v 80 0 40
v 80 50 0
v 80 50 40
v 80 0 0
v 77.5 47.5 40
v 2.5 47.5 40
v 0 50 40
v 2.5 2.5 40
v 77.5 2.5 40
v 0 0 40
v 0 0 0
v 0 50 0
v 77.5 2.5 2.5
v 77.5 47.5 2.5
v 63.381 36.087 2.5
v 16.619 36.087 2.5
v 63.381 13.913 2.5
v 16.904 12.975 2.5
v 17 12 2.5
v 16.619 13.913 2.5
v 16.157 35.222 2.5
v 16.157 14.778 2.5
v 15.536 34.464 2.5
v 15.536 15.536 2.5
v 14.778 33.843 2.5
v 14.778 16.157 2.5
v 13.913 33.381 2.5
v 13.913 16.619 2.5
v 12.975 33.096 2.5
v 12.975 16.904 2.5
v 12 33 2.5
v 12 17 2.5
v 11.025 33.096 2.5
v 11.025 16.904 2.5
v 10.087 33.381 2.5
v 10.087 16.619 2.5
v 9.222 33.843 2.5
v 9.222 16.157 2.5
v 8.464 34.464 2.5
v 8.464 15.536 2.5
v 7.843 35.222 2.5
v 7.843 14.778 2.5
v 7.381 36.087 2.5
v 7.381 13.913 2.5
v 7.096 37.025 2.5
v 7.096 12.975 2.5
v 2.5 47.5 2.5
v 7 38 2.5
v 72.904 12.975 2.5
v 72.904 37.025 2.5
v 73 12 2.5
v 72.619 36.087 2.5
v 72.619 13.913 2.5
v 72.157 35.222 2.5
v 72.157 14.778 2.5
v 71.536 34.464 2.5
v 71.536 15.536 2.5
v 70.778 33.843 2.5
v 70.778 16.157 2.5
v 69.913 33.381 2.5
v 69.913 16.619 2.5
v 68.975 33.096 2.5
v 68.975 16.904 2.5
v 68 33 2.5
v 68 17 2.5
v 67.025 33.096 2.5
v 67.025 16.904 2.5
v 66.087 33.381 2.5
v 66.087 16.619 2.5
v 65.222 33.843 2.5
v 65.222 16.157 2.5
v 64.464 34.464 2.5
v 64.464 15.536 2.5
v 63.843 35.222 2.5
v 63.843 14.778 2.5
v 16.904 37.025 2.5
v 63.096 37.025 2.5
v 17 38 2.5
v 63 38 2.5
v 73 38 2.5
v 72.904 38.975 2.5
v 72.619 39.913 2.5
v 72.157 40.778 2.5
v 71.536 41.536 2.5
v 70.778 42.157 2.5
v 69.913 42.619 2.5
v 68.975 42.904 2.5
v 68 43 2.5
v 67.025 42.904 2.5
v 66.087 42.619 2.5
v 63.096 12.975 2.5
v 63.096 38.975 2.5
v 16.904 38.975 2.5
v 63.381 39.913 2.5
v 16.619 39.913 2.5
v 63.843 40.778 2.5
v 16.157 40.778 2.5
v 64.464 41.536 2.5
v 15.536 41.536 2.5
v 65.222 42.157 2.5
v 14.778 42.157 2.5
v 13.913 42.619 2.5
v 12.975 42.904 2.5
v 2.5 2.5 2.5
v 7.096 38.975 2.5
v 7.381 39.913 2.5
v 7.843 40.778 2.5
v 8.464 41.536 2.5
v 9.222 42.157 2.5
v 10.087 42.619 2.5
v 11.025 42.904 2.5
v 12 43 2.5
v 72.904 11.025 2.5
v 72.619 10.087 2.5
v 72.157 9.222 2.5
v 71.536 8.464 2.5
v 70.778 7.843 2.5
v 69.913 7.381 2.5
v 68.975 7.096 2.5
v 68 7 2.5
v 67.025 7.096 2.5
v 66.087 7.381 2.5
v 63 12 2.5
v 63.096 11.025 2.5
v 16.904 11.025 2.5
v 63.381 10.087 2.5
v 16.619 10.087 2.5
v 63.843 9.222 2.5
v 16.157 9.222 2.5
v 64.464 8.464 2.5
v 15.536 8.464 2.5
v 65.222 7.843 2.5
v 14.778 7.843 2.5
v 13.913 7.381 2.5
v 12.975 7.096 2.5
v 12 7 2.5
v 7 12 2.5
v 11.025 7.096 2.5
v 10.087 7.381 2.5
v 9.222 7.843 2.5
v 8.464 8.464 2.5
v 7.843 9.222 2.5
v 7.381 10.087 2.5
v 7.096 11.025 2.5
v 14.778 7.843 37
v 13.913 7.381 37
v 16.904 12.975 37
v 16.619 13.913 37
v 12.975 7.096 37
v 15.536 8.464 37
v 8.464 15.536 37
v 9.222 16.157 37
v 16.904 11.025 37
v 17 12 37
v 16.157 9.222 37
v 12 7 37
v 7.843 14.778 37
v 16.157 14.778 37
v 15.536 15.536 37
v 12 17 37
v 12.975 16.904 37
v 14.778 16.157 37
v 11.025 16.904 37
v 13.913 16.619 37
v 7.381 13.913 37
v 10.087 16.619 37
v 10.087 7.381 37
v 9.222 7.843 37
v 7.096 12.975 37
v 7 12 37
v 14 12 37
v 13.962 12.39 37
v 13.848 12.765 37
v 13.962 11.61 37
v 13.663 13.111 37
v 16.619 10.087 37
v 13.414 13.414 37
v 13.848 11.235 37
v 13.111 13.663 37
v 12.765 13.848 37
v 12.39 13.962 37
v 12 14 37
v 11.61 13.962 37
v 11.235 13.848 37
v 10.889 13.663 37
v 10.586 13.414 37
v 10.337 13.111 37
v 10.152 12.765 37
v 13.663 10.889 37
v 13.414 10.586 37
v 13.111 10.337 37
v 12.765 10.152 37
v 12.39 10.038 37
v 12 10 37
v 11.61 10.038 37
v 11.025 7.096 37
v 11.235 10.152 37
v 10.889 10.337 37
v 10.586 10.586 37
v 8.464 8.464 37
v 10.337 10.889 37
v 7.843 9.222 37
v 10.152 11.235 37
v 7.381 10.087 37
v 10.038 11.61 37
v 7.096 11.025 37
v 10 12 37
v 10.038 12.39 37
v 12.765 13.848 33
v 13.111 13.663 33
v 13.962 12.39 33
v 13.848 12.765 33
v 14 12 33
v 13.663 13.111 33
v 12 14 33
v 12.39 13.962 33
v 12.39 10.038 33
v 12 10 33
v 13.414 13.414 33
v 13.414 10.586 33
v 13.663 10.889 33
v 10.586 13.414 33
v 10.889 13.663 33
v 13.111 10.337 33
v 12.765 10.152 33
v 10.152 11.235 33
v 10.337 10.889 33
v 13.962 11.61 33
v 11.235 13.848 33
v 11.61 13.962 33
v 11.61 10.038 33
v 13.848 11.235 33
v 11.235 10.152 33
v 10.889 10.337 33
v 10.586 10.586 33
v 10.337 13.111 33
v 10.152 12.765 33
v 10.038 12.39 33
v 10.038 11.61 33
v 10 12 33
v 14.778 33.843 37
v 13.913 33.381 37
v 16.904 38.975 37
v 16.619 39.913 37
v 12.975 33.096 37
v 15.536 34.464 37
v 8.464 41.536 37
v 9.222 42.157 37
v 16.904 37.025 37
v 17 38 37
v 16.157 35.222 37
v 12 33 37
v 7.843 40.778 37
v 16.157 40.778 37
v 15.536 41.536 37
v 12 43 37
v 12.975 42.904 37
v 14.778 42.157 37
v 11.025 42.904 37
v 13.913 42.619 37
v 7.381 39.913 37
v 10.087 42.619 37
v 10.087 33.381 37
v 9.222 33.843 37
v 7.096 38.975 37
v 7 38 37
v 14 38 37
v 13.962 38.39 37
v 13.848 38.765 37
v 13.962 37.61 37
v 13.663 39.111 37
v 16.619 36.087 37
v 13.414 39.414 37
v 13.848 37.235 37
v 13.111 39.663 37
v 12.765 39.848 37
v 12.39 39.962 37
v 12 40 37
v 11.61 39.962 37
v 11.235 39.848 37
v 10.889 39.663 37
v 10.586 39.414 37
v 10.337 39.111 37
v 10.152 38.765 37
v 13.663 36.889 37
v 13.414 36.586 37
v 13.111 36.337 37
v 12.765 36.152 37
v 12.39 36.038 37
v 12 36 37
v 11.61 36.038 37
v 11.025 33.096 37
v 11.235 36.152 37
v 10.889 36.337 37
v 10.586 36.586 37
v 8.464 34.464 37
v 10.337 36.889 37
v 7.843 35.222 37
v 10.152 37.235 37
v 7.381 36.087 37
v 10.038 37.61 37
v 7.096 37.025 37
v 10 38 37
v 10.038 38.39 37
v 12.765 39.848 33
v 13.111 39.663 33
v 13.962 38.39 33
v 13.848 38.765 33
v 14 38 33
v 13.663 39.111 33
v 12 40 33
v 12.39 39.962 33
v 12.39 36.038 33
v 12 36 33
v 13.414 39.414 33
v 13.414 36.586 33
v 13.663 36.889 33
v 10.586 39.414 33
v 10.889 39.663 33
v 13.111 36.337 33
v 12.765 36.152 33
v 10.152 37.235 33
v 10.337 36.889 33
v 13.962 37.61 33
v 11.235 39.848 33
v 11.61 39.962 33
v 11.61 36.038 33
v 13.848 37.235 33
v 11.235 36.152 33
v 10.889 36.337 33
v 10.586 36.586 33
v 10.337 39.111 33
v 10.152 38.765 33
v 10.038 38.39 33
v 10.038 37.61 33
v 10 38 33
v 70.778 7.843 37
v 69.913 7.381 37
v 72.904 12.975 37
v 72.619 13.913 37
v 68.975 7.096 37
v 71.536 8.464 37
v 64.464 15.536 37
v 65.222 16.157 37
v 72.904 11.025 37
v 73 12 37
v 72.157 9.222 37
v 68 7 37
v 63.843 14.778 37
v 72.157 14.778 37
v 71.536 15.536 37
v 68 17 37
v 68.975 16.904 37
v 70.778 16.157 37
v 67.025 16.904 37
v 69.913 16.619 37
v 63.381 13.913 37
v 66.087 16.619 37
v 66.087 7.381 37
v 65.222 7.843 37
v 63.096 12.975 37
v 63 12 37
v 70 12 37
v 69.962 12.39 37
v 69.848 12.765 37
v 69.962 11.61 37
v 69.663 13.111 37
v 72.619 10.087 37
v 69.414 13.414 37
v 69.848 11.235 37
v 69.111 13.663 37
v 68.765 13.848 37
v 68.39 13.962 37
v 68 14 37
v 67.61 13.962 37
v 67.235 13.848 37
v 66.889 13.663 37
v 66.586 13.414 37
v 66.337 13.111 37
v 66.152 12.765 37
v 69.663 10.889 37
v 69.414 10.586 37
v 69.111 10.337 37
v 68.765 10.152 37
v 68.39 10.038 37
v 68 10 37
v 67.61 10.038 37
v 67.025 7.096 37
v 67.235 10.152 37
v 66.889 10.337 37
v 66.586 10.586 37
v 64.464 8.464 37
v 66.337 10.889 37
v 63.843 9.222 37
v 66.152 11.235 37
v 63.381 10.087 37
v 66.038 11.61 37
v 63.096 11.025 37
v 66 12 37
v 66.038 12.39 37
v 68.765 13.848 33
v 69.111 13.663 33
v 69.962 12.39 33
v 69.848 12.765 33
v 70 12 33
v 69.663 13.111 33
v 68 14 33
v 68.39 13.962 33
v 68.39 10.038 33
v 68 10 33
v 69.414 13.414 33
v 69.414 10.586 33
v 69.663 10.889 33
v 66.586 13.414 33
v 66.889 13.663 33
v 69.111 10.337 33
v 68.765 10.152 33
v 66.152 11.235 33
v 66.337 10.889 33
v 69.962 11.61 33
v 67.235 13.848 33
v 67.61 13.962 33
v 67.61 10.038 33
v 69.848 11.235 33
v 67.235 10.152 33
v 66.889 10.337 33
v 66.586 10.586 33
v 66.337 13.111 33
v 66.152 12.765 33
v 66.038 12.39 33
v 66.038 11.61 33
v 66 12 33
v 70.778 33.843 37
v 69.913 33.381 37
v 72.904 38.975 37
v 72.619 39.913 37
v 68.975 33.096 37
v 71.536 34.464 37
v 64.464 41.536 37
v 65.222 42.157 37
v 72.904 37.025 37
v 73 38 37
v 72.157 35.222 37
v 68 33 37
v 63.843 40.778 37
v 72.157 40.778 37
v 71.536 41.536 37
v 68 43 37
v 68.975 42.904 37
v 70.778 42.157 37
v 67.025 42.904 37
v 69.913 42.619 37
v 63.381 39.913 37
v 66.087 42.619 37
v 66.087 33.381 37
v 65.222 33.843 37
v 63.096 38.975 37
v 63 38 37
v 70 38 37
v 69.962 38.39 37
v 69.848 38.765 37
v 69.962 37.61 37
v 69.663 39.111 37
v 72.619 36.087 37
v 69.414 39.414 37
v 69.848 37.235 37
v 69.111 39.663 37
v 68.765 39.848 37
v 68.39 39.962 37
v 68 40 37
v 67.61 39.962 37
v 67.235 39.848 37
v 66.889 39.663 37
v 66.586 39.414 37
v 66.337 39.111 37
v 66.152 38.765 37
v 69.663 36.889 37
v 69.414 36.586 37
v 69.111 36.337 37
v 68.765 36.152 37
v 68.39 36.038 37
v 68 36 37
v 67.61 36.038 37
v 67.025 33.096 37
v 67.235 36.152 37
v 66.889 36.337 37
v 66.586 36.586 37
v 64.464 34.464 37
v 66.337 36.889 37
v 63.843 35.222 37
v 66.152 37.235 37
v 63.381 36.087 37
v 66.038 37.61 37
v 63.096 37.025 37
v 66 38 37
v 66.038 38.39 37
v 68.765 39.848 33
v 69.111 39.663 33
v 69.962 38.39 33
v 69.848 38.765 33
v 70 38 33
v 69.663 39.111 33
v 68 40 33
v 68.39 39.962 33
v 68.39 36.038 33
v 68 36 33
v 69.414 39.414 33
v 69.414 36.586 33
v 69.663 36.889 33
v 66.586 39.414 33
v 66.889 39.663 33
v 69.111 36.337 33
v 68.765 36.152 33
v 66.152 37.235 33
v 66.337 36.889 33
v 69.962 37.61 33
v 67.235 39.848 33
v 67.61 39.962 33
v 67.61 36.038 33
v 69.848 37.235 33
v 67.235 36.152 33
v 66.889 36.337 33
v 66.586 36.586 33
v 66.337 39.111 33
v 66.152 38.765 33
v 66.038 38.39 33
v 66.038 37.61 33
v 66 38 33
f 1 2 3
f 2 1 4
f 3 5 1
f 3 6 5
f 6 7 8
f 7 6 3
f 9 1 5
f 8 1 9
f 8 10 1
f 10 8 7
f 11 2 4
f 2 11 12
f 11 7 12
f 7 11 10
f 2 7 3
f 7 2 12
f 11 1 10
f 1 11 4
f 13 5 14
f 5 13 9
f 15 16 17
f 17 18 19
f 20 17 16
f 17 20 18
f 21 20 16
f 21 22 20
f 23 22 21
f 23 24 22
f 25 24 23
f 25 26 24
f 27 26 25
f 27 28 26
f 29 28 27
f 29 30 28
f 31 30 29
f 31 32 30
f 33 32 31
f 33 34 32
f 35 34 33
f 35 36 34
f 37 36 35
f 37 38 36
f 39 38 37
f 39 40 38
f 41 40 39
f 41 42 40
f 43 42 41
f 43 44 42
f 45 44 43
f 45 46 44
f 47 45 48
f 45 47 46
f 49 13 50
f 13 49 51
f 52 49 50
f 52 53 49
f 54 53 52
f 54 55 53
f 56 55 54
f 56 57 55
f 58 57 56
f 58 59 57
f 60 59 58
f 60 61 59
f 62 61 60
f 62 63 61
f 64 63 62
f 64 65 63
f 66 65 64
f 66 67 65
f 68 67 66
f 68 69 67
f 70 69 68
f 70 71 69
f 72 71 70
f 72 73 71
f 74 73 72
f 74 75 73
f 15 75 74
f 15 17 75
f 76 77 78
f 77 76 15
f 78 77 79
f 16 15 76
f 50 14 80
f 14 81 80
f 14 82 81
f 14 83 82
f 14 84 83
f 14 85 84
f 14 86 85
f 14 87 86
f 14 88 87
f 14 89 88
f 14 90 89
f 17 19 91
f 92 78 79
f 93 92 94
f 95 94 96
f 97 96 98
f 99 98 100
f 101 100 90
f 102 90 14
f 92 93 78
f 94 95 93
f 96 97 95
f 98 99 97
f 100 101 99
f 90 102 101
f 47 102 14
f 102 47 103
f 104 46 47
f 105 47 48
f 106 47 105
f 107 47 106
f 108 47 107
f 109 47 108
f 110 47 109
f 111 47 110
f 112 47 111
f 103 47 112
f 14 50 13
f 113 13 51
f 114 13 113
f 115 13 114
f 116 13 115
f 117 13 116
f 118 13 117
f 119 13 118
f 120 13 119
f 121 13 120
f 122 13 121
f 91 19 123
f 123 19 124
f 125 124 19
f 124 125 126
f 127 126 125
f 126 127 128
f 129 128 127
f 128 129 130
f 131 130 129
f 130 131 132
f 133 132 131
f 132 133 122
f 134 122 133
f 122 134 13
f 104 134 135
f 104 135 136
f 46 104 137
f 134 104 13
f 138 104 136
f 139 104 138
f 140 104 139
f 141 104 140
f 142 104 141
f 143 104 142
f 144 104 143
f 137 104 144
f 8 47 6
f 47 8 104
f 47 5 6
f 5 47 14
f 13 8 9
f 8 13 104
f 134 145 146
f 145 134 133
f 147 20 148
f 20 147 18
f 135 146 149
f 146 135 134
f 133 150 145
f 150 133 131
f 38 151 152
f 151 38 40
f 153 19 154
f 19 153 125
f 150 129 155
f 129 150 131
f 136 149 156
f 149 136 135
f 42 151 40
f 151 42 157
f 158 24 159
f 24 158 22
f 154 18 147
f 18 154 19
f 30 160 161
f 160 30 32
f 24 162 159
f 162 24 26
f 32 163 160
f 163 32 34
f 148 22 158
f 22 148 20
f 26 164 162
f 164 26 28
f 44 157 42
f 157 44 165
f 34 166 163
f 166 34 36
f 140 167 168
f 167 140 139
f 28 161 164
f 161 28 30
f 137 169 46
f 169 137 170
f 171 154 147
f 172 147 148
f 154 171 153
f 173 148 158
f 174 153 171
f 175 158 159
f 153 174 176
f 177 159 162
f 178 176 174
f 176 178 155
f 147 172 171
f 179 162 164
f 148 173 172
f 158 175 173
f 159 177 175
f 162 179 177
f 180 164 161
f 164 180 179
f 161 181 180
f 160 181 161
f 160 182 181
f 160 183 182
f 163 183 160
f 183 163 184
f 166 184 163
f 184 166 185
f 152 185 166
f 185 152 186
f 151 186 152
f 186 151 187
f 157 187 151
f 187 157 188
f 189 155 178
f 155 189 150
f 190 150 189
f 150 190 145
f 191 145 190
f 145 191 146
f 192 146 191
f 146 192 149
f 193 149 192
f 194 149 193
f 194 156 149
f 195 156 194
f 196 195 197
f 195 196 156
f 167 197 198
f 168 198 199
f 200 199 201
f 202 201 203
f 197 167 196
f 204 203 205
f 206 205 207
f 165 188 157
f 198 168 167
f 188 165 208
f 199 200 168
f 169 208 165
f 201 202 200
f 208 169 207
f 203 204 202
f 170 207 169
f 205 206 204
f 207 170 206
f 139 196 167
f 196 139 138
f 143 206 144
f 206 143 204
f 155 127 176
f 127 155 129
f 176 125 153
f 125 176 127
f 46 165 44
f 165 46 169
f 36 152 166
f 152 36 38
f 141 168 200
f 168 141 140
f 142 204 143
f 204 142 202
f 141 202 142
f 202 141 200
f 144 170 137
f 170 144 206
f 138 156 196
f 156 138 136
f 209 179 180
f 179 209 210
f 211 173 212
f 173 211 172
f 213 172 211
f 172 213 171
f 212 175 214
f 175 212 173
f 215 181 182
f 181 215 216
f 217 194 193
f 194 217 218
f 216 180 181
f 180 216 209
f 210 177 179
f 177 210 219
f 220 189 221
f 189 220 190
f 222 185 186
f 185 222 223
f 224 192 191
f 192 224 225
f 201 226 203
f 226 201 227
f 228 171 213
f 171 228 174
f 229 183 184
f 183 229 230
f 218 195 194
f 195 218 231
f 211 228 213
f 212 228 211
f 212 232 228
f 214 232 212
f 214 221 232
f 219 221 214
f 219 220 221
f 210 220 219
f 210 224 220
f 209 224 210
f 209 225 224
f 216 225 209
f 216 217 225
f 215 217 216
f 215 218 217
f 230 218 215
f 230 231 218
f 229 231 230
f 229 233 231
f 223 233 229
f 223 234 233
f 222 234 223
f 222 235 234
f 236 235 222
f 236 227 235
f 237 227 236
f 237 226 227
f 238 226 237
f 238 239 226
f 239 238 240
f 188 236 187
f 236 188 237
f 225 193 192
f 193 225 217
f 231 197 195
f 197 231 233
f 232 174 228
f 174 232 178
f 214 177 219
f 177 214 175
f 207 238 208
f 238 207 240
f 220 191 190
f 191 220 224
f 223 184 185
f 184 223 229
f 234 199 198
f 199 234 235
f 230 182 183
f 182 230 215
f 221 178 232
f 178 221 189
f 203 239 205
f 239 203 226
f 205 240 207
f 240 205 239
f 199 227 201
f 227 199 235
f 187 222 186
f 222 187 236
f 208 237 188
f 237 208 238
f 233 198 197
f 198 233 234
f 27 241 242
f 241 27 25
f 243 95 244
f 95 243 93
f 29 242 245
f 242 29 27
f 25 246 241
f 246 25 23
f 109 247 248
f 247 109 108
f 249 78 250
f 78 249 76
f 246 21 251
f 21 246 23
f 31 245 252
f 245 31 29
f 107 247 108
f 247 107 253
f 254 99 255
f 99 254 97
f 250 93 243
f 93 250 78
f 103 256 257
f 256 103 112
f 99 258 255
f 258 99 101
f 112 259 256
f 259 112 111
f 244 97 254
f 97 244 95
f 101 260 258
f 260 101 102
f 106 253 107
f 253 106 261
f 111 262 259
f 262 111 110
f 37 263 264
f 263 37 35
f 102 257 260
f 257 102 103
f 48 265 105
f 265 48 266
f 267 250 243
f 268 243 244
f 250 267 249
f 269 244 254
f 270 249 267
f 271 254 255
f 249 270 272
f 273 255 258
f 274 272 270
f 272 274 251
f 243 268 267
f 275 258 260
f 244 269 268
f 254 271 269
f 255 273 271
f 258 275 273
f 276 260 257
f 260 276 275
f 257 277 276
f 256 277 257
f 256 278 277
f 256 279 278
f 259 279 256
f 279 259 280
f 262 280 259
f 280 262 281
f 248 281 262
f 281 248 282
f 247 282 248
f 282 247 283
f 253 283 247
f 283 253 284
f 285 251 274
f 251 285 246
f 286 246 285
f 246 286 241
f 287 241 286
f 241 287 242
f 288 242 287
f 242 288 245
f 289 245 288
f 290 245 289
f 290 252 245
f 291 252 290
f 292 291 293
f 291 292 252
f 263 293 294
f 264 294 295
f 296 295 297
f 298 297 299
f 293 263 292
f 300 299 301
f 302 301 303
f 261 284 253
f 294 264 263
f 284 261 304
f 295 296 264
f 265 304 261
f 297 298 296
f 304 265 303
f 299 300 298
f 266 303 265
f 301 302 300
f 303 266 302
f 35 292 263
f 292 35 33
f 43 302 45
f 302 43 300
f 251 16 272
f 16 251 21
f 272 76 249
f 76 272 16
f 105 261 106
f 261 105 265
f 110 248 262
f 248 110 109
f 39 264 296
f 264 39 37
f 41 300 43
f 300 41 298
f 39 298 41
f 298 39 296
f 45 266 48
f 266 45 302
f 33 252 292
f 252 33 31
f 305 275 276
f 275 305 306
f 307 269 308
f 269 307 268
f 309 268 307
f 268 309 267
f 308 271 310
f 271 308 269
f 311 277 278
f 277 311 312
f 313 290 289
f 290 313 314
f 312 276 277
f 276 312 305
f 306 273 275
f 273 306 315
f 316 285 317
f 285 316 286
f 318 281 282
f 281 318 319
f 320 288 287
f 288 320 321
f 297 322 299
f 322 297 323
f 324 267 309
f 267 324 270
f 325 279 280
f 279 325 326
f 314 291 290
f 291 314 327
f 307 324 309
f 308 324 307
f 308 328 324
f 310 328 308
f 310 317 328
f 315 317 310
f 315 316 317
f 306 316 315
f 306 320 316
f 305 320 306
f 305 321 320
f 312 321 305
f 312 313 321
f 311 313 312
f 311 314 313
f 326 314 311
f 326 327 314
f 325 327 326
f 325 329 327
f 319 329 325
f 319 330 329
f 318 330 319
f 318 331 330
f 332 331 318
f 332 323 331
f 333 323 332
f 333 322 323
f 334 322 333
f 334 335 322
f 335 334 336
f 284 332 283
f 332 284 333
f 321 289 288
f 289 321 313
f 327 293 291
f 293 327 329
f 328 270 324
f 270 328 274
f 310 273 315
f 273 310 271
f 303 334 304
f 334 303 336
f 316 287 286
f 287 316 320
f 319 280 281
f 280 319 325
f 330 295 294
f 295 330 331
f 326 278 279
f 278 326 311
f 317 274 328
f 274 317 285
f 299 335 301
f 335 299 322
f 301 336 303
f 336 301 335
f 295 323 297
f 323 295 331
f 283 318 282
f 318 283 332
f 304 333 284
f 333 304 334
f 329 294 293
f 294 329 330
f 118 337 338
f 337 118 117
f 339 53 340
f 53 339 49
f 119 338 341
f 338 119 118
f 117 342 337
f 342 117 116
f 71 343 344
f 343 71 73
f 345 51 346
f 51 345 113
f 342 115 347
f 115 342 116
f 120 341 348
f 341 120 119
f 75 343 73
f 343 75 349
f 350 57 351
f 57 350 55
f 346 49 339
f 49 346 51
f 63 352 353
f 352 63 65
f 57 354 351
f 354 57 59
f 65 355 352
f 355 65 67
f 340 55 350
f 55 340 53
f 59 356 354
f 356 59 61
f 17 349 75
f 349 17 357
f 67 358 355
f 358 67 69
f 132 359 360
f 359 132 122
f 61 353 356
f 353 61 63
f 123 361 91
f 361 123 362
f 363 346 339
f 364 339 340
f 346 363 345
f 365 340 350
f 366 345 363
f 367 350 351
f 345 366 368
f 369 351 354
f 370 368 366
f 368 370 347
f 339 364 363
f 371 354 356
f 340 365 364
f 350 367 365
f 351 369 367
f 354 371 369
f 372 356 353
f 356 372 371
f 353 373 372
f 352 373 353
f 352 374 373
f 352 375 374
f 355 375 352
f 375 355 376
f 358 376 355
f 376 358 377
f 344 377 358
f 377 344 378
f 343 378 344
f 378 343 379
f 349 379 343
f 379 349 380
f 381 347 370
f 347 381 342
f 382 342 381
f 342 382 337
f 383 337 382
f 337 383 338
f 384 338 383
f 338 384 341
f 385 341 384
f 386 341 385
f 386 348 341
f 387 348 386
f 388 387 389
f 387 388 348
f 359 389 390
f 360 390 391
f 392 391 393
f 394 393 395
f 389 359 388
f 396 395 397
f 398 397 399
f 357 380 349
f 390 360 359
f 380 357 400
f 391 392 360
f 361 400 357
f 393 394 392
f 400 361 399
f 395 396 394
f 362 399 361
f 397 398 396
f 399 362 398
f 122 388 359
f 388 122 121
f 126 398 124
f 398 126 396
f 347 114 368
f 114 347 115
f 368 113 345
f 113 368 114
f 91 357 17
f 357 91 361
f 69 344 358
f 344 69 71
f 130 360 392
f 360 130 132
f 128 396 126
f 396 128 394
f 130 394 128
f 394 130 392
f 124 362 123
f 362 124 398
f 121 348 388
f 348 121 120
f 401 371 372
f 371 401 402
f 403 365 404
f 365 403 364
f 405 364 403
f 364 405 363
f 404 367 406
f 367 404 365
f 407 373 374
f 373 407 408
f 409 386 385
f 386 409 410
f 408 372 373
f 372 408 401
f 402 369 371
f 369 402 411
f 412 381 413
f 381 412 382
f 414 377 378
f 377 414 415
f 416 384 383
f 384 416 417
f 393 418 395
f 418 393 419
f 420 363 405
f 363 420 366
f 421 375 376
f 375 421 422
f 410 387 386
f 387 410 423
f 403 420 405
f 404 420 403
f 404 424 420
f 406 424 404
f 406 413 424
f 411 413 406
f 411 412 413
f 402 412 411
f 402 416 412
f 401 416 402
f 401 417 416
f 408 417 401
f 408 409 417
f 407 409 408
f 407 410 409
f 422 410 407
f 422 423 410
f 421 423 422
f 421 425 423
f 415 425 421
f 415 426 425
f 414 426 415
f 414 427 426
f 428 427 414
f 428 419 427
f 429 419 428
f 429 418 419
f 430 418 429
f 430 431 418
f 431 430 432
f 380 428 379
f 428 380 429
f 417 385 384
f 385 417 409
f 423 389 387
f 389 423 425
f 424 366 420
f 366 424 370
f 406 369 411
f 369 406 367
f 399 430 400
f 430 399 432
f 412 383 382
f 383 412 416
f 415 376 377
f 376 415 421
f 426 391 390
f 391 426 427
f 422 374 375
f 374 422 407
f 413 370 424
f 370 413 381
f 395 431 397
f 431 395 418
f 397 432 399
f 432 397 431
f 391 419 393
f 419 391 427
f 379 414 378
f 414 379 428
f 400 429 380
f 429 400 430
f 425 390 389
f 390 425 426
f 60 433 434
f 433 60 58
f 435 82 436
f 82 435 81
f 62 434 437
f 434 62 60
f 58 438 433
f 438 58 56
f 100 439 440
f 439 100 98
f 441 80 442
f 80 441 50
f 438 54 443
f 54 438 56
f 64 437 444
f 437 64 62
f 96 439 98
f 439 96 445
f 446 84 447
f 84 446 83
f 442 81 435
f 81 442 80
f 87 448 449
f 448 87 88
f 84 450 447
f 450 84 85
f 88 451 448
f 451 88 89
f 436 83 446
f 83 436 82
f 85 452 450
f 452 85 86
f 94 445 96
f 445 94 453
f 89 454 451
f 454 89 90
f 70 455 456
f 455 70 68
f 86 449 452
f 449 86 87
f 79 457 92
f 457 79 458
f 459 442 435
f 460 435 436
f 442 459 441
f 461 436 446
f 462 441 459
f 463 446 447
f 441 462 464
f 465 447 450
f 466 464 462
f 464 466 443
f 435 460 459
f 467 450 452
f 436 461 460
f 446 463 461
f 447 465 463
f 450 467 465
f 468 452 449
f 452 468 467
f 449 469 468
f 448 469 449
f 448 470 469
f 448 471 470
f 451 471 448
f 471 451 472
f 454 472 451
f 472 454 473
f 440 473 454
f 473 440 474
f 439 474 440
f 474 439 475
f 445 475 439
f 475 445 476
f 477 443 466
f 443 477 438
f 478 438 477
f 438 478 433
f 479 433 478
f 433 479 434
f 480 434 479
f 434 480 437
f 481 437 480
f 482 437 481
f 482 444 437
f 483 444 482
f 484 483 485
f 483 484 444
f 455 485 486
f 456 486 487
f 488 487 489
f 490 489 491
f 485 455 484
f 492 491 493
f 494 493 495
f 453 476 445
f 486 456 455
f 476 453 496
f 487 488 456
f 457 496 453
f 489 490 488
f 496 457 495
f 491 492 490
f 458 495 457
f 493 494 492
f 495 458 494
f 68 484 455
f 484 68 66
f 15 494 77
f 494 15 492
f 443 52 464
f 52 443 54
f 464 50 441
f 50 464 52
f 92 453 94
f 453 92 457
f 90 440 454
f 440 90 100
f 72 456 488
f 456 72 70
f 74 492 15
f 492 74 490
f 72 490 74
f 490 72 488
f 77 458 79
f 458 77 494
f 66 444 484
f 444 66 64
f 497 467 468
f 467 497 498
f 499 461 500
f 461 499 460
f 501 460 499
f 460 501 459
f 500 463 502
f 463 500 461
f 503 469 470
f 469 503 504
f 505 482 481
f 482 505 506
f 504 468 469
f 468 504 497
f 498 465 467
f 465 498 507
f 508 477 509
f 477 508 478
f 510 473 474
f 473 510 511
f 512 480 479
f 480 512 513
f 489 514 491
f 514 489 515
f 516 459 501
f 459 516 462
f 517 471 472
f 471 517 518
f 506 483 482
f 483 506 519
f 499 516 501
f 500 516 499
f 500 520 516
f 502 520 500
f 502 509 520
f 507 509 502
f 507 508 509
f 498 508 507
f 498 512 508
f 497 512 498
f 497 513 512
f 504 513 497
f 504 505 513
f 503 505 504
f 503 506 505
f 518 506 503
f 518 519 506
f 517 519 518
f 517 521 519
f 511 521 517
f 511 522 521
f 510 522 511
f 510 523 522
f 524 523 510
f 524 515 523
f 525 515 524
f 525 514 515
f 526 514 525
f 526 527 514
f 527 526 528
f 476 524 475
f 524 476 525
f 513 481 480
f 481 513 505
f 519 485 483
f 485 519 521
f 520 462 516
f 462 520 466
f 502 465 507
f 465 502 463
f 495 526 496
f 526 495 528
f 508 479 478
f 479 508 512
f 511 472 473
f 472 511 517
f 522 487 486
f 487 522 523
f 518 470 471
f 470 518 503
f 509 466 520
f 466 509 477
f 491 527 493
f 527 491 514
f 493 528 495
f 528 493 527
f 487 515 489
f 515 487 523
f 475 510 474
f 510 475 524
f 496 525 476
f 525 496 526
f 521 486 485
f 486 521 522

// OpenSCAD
$fn = 32;

// ----------------------------------------------------------------------
// Enclosure box: bosses enclosure
// ----------------------------------------------------------------------

// --- parameters (mm) ---
box_l = 80;               // outer length, X
box_w = 50;               // outer width, Y
box_h = 40;               // outer height
wall_t = 2.5;             // wall thickness
boss_r = 5;               // corner boss radius
hole_r = 2;               // boss screw hole radius
boss_in = 12;             // boss inset from the corners

inner_h = box_h - wall_t;  // cavity depth
boss_h = inner_h - 2;  // corner boss height

difference() {
  union() {
    difference() {
      cube([box_l, box_w, box_h]);
      translate([wall_t, wall_t, wall_t])
        cube([box_l - 2 * wall_t, box_w - 2 * wall_t, box_h]);
    }
    for (sx = [0, 1], sy = [0, 1])
      translate([sx ? box_l - boss_in : boss_in,
                 sy ? box_w - boss_in : boss_in, wall_t - 1])
        difference() {
          cylinder(r = boss_r, h = boss_h);
          translate([0, 0, boss_h - 4])
            cylinder(r = hole_r, h = 5);
        }
  }
}
